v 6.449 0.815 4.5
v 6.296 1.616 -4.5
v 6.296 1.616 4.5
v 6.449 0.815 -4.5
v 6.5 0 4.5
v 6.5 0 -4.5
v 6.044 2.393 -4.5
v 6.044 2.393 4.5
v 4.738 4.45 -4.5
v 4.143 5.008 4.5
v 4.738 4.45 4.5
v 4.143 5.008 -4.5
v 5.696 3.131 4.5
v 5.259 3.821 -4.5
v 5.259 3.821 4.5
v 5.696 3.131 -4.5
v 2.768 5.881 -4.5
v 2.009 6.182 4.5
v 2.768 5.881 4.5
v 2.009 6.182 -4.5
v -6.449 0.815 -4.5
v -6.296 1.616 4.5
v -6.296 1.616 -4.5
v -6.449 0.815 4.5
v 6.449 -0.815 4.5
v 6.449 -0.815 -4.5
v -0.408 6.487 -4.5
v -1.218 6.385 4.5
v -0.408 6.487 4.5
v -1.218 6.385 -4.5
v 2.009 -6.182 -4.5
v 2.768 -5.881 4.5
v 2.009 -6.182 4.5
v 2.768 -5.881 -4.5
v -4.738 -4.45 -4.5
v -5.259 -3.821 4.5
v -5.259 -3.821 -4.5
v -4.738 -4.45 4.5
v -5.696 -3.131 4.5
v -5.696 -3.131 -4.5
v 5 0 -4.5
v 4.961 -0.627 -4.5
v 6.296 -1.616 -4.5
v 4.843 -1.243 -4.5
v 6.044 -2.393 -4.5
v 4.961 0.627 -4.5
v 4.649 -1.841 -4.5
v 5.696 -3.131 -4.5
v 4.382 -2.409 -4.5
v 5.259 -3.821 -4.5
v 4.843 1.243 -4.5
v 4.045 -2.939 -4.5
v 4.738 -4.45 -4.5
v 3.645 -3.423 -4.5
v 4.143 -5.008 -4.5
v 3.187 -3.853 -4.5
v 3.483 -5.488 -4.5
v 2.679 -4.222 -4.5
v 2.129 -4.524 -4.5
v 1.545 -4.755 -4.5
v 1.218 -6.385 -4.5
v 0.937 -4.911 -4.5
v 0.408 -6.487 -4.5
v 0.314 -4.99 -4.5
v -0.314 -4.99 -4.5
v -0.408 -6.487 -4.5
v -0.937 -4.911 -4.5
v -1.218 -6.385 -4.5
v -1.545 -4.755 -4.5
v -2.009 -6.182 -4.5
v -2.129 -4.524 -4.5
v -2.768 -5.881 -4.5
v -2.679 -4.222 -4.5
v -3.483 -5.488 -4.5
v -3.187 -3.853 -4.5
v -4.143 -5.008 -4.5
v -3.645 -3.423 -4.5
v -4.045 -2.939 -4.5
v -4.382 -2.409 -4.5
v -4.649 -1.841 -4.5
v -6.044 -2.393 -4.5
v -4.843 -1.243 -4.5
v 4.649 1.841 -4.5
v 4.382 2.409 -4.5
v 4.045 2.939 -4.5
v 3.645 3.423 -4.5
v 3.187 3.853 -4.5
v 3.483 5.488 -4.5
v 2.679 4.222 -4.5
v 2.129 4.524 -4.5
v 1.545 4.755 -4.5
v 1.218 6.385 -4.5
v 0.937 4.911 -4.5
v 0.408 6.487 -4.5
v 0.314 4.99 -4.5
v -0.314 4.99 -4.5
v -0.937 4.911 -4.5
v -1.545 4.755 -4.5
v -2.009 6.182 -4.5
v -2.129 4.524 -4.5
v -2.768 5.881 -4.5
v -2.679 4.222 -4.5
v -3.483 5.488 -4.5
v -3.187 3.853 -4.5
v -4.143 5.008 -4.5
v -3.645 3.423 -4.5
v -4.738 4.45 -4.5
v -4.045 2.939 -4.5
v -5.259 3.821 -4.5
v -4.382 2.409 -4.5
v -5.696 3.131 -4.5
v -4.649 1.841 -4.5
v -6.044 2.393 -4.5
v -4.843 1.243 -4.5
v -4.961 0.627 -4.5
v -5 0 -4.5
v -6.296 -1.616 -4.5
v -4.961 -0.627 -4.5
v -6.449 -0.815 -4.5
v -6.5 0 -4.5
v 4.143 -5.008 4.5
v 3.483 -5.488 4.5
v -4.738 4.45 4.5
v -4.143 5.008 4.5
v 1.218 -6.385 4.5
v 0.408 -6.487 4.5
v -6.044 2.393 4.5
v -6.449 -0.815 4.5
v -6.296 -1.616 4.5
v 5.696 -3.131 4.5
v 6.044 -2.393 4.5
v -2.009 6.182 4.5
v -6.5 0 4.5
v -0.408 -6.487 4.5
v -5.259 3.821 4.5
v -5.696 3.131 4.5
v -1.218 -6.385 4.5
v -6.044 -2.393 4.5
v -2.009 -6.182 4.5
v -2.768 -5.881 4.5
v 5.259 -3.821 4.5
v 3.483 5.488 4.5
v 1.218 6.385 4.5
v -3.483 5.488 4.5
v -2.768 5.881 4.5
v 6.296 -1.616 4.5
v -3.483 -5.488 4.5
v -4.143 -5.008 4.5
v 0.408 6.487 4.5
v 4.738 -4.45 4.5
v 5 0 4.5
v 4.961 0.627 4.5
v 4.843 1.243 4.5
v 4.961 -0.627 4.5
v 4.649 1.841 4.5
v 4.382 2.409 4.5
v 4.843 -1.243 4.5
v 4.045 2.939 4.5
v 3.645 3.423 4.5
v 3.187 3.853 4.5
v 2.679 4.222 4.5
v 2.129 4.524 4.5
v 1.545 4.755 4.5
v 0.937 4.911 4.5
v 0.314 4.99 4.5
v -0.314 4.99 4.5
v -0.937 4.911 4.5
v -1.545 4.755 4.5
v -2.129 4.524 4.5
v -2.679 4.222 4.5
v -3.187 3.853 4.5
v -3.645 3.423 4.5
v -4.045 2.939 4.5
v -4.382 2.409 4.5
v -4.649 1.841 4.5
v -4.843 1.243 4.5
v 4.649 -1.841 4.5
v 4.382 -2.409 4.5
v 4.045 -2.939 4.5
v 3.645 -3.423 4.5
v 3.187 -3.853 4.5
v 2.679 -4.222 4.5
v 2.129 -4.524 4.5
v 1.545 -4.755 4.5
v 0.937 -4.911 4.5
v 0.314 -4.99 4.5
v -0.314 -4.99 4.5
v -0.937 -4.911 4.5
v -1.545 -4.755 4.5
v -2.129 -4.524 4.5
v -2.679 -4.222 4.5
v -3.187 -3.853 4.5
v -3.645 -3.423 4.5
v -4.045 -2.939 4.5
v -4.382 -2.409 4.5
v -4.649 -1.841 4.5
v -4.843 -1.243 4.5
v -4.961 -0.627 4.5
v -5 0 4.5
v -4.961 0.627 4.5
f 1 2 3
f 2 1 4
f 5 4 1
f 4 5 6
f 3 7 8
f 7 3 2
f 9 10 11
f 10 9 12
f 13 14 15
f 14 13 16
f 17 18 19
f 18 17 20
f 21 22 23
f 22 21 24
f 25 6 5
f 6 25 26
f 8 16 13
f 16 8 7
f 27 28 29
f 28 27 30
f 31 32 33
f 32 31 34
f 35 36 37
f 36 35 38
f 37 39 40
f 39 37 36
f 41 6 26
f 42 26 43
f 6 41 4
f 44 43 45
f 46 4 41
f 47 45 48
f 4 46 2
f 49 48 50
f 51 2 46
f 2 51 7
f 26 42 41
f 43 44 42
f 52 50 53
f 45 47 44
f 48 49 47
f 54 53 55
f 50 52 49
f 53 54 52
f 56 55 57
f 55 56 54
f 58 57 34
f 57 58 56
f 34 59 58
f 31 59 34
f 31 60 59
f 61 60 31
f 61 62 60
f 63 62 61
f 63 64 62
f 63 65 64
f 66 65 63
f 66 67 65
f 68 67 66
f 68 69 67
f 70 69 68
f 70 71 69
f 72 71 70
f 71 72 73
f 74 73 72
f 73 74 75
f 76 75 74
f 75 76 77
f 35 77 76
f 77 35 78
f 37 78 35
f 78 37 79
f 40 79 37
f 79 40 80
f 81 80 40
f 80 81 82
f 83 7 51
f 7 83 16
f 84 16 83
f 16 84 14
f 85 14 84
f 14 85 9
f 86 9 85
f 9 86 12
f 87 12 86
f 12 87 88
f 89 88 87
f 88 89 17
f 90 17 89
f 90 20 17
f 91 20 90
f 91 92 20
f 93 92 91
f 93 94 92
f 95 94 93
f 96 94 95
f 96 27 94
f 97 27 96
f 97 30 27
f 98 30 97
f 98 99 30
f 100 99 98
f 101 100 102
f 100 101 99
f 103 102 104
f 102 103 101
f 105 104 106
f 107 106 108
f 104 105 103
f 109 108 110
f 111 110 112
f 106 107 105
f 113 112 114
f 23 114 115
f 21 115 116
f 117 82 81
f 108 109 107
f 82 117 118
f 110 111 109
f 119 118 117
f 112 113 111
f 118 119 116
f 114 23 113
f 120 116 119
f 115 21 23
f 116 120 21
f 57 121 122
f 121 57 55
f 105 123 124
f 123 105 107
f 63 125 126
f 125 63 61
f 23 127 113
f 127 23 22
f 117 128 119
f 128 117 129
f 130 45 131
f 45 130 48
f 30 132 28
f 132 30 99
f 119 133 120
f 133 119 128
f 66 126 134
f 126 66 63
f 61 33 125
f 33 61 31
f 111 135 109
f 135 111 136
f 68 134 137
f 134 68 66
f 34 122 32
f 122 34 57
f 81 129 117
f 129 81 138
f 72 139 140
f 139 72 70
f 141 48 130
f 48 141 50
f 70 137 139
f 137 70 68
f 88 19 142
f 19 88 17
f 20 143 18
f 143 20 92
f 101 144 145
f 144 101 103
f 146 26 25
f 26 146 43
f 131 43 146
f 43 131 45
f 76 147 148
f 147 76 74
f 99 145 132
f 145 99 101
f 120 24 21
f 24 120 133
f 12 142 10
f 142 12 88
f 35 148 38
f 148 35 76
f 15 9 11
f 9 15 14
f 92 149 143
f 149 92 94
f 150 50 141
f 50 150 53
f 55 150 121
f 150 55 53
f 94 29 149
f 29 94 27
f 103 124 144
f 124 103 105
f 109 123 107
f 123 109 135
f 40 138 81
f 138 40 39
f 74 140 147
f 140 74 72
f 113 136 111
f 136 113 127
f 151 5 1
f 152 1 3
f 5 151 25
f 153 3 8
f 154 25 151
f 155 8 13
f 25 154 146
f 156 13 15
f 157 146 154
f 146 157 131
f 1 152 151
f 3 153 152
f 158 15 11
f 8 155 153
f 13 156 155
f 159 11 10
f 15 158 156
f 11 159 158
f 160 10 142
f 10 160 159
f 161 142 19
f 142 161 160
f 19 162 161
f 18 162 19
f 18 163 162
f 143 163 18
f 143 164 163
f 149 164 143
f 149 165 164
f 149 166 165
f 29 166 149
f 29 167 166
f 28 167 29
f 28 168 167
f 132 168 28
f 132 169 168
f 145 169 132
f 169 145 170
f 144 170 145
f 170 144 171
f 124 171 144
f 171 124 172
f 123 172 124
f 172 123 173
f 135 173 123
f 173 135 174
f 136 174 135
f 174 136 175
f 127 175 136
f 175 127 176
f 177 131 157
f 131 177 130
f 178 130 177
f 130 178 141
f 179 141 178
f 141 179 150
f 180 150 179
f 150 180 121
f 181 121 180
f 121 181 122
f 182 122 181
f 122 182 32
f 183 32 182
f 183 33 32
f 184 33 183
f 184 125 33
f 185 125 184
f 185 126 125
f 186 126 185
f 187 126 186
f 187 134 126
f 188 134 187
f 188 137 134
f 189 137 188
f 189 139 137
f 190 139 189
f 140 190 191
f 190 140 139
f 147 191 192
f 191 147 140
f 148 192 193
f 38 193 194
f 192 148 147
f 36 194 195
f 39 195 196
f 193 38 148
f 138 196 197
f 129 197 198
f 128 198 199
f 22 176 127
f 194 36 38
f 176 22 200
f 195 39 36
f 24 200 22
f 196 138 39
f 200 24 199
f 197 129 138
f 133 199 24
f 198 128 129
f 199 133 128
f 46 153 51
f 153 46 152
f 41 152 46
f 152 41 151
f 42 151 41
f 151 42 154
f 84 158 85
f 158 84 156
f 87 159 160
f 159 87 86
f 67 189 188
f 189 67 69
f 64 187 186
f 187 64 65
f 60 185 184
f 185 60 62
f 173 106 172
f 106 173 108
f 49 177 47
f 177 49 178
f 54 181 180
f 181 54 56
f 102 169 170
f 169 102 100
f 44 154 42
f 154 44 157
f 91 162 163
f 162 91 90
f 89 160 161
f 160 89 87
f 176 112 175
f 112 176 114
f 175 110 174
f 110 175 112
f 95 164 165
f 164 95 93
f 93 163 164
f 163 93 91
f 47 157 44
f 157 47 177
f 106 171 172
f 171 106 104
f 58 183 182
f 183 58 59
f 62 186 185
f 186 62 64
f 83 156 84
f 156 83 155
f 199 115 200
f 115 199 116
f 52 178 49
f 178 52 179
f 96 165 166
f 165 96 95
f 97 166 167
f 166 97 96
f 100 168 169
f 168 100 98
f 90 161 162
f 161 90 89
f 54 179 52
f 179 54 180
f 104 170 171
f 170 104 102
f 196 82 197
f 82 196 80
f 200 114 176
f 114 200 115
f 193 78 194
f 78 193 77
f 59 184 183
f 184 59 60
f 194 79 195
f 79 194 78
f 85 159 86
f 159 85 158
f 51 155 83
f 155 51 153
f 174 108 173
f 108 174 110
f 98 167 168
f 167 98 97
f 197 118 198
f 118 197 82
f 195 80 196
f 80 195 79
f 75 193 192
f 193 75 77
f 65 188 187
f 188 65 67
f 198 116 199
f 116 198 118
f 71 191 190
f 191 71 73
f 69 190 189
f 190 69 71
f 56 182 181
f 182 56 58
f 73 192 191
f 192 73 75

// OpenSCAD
$fn = 50;


difference() {
	union() {
		translate(v = [0, 0, -4.5000000000]) {
			cylinder(h = 9, r = 6.5000000000);
		}
	}
	union() {
		translate(v = [0, 0, -100.0000000000]) {
			cylinder(h = 200, r = 5.0000000000);
		}
	}
}
